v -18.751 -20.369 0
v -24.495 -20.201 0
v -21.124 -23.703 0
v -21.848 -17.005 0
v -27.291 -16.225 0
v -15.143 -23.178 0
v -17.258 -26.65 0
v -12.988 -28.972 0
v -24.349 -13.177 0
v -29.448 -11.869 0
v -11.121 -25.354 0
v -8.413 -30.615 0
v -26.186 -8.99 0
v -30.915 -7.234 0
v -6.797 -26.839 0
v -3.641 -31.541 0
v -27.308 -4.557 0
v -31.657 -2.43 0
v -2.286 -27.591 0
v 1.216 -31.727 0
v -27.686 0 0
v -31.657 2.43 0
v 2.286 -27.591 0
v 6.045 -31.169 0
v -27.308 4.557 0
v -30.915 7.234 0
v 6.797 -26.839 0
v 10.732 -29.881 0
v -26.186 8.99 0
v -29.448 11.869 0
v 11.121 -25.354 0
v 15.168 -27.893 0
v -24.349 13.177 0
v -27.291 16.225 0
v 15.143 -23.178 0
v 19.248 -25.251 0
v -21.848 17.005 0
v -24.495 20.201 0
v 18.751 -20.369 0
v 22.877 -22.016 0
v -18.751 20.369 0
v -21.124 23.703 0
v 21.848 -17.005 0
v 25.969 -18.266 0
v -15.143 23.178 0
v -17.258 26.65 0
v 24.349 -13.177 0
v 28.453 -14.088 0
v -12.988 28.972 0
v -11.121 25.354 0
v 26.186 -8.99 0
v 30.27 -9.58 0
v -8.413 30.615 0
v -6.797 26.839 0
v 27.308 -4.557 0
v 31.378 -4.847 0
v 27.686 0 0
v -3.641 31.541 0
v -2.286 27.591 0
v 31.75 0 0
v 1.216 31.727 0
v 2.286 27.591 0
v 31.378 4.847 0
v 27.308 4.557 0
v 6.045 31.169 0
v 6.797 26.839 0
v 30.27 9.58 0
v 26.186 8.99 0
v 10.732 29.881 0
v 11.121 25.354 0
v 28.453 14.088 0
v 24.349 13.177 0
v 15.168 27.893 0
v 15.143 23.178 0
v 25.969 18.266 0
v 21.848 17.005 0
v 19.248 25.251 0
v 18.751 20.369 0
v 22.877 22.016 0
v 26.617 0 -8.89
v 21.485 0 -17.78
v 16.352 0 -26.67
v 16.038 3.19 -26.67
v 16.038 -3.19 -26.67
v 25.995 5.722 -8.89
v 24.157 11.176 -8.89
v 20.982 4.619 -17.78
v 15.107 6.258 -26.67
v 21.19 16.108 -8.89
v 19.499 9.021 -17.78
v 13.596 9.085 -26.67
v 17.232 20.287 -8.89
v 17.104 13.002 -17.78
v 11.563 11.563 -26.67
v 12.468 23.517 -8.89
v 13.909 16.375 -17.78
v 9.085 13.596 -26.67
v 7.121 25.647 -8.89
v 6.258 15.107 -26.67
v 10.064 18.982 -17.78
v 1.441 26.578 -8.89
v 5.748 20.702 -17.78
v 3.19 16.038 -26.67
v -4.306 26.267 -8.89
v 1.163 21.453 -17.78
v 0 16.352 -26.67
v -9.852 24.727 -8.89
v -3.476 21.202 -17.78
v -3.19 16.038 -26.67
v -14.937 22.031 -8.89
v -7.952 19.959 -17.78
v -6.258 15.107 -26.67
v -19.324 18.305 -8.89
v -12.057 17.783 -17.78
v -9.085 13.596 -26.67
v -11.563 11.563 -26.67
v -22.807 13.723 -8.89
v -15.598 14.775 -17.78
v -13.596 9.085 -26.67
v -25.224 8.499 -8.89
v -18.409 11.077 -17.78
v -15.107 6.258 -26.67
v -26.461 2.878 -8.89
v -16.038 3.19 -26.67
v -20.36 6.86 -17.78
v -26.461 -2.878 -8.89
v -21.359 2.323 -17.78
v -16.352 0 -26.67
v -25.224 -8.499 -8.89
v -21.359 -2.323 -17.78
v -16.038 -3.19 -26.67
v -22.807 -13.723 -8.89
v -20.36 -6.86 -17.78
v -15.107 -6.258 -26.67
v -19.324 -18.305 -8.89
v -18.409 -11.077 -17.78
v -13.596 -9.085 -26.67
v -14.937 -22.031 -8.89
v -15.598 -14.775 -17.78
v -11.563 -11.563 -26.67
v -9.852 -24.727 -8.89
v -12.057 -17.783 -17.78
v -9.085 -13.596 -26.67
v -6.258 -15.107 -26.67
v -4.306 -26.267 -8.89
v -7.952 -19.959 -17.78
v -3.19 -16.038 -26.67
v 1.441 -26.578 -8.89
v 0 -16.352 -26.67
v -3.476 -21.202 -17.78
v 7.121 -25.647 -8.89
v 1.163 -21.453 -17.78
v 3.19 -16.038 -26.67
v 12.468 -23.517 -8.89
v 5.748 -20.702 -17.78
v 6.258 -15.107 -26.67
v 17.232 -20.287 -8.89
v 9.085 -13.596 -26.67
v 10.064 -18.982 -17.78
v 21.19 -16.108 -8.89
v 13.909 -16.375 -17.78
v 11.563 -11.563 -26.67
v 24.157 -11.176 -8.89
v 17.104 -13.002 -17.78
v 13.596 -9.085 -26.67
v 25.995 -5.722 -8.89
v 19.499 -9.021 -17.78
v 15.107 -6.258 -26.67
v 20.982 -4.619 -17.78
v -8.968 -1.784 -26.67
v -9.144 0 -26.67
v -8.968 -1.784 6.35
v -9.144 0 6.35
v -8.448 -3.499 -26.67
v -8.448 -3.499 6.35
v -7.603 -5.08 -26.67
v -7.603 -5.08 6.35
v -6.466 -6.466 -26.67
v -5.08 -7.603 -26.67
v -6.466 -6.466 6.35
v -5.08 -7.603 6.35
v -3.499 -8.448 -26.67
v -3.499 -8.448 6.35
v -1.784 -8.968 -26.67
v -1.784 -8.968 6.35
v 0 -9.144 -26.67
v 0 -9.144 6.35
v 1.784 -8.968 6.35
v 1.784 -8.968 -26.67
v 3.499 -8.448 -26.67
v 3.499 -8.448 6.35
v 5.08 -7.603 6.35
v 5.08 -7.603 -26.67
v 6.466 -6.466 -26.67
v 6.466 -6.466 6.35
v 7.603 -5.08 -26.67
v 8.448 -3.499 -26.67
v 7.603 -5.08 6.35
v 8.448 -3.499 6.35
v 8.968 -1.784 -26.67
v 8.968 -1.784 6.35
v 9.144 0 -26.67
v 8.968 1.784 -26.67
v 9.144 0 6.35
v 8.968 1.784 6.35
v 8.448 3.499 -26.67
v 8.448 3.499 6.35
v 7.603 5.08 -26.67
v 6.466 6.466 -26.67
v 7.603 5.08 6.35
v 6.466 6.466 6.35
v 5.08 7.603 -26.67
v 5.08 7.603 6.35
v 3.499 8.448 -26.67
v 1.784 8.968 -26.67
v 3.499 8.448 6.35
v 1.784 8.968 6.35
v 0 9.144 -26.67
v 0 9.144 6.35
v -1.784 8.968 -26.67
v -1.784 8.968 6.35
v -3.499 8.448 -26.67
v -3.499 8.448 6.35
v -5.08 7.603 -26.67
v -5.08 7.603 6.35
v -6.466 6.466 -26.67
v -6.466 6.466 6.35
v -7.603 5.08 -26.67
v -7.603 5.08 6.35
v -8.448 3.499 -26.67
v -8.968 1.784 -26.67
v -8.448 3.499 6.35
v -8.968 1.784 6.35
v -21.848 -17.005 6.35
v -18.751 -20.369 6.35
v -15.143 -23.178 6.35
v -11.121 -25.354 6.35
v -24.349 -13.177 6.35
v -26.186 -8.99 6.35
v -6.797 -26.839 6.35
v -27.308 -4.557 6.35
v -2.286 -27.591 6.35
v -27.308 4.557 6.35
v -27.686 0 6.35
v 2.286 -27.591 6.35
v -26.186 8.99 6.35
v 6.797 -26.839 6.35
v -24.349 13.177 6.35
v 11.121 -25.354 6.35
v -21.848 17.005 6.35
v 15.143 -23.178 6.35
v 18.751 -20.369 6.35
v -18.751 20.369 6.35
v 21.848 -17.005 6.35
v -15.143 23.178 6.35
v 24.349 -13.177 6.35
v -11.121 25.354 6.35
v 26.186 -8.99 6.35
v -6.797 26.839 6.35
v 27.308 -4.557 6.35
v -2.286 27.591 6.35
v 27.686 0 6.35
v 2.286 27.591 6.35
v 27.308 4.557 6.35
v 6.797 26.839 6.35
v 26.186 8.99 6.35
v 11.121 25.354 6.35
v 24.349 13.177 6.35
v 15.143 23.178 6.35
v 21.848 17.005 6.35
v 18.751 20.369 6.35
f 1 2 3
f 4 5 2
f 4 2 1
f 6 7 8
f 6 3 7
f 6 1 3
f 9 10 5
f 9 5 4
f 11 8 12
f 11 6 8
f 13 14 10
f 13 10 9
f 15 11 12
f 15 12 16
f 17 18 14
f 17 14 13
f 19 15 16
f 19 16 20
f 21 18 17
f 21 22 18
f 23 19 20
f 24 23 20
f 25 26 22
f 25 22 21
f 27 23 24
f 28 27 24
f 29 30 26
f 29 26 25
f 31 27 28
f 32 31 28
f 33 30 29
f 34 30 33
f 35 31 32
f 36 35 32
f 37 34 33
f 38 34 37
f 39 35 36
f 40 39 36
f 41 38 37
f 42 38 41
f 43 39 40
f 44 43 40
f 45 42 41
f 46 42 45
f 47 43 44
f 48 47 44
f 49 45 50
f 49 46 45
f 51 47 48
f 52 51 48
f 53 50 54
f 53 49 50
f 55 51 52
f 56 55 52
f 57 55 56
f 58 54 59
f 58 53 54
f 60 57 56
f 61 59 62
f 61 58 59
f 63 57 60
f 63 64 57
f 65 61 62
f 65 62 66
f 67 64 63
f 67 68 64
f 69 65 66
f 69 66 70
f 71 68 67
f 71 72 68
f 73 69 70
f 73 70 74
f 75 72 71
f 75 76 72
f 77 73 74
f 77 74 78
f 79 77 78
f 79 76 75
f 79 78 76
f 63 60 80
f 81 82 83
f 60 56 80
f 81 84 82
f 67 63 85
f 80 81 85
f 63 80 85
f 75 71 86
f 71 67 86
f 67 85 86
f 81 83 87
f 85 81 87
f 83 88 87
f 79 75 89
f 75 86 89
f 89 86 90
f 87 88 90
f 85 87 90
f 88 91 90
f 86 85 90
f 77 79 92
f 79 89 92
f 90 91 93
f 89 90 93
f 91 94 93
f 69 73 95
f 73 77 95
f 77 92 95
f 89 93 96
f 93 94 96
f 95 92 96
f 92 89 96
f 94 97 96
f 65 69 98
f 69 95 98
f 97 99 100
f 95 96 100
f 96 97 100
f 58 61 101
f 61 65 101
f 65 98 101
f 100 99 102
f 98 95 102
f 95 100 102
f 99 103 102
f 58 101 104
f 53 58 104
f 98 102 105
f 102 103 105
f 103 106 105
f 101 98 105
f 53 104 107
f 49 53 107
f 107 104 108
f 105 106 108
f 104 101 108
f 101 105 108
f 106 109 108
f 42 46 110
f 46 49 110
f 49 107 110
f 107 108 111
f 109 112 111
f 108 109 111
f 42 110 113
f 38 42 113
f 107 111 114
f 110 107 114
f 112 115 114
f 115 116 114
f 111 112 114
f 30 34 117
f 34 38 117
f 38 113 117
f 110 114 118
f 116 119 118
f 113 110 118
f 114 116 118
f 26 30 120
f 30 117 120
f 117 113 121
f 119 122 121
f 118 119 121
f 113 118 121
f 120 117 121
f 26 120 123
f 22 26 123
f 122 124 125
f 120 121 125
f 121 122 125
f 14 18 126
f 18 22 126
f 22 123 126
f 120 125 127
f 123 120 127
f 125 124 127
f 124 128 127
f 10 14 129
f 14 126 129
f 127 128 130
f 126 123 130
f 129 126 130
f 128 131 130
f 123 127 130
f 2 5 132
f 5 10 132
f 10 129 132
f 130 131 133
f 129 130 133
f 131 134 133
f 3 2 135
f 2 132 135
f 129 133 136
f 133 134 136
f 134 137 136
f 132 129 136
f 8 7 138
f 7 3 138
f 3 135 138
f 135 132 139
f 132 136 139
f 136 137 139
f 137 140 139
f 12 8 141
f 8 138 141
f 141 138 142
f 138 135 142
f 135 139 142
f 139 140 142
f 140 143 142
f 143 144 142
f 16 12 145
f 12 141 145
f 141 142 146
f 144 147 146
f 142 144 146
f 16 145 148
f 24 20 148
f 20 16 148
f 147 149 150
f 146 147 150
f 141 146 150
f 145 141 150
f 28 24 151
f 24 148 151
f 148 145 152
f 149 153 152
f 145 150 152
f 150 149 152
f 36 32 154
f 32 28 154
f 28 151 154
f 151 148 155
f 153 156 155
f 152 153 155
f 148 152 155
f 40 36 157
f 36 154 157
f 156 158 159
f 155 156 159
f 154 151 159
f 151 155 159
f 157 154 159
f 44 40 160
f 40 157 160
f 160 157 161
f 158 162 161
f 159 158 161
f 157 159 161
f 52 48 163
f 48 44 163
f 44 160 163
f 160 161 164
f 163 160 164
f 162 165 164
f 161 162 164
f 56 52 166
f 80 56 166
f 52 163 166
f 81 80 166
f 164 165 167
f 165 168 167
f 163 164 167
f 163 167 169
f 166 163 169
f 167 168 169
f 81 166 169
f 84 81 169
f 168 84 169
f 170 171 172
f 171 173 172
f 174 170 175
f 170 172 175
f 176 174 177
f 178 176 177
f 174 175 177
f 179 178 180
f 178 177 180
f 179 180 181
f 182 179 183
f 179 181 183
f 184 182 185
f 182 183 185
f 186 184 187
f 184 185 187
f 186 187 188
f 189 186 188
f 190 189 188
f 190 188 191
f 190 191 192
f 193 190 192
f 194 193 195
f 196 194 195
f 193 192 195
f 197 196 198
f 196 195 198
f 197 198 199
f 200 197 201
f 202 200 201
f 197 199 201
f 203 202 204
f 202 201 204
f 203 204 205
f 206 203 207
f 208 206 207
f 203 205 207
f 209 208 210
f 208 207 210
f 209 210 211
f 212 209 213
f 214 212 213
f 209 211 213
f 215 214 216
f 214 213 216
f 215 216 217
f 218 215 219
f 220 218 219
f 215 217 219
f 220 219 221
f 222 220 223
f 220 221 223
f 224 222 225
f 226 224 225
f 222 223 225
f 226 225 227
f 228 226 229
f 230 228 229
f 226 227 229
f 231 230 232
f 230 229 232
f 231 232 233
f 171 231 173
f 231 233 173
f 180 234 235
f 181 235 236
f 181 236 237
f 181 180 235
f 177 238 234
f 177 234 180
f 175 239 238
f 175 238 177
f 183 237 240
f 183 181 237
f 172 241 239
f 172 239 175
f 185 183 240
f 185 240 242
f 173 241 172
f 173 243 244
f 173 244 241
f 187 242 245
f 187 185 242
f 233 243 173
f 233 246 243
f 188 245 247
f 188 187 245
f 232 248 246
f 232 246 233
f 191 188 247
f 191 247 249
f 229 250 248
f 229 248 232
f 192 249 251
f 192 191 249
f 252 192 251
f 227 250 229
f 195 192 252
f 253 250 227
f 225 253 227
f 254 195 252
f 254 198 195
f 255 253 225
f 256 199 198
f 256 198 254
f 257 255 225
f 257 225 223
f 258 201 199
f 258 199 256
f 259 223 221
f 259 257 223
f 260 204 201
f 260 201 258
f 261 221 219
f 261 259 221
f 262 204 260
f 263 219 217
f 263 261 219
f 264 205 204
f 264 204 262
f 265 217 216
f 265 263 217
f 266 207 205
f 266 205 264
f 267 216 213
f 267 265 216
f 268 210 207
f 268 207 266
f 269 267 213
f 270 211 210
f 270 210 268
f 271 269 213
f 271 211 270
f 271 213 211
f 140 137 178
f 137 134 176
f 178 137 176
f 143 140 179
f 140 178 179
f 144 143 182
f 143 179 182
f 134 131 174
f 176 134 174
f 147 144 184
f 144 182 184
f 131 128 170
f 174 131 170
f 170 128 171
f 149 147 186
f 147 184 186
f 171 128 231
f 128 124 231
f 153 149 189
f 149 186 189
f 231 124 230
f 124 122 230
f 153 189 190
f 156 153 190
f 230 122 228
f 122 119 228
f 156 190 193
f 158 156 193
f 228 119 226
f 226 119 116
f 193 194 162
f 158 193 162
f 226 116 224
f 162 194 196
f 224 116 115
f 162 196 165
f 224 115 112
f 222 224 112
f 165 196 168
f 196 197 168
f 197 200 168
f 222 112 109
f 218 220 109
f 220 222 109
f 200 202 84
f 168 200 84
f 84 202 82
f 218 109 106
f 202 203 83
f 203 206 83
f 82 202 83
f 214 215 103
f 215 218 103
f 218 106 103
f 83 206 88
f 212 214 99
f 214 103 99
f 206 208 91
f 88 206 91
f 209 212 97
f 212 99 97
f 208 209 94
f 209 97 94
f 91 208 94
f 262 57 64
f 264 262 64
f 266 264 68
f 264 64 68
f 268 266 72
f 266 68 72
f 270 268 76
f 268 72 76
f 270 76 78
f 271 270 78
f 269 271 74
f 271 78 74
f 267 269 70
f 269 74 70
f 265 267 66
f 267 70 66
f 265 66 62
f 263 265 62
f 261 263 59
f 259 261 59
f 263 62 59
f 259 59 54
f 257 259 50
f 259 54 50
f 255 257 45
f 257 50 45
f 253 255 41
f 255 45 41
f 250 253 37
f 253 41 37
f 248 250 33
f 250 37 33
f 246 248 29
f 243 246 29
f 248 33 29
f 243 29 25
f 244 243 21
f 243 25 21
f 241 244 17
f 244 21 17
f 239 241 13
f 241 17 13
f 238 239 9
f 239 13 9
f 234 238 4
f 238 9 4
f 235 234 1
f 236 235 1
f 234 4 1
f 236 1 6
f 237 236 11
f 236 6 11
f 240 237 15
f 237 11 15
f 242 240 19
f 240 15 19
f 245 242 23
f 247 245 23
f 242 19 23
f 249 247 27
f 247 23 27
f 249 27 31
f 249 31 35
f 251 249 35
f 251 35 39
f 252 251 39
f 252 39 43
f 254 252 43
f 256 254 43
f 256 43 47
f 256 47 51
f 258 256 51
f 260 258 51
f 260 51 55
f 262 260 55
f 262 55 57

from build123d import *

# Parameters (mm, degrees)
F0_R     = 27.686
F1_DEPTH = 6.35
F2_D     = 18.288
F3_R     = 31.75
F5_DEPTH = 26.67
F5_TAPER = 30
F7_D     = 18.288


with BuildPart() as f1:
    # F0 (on Top) → F1 (new body)
    with BuildSketch(Plane.XY):
        Circle(F0_R)
    extrude(amount=F1_DEPTH)

    # F2 (through all)
    with Locations(Plane(origin=(0, 0, 0), x_dir=(1, 0, 0), z_dir=(0, 0, -1))):
        with Locations((0, 0)):
            Hole(F2_D / 2)

    # F3 (on Top) → F5 (join)
    with BuildSketch(Plane.XY):
        Circle(F3_R)
    extrude(amount=-F5_DEPTH, taper=F5_TAPER)

    # F7 (through all)
    with Locations(Plane(origin=(0, 0, -26.67), x_dir=(1, 0, 0), z_dir=(0, 0, -1))):
        with Locations((0, 0)):
            Hole(F7_D / 2)


solid = f1.part
